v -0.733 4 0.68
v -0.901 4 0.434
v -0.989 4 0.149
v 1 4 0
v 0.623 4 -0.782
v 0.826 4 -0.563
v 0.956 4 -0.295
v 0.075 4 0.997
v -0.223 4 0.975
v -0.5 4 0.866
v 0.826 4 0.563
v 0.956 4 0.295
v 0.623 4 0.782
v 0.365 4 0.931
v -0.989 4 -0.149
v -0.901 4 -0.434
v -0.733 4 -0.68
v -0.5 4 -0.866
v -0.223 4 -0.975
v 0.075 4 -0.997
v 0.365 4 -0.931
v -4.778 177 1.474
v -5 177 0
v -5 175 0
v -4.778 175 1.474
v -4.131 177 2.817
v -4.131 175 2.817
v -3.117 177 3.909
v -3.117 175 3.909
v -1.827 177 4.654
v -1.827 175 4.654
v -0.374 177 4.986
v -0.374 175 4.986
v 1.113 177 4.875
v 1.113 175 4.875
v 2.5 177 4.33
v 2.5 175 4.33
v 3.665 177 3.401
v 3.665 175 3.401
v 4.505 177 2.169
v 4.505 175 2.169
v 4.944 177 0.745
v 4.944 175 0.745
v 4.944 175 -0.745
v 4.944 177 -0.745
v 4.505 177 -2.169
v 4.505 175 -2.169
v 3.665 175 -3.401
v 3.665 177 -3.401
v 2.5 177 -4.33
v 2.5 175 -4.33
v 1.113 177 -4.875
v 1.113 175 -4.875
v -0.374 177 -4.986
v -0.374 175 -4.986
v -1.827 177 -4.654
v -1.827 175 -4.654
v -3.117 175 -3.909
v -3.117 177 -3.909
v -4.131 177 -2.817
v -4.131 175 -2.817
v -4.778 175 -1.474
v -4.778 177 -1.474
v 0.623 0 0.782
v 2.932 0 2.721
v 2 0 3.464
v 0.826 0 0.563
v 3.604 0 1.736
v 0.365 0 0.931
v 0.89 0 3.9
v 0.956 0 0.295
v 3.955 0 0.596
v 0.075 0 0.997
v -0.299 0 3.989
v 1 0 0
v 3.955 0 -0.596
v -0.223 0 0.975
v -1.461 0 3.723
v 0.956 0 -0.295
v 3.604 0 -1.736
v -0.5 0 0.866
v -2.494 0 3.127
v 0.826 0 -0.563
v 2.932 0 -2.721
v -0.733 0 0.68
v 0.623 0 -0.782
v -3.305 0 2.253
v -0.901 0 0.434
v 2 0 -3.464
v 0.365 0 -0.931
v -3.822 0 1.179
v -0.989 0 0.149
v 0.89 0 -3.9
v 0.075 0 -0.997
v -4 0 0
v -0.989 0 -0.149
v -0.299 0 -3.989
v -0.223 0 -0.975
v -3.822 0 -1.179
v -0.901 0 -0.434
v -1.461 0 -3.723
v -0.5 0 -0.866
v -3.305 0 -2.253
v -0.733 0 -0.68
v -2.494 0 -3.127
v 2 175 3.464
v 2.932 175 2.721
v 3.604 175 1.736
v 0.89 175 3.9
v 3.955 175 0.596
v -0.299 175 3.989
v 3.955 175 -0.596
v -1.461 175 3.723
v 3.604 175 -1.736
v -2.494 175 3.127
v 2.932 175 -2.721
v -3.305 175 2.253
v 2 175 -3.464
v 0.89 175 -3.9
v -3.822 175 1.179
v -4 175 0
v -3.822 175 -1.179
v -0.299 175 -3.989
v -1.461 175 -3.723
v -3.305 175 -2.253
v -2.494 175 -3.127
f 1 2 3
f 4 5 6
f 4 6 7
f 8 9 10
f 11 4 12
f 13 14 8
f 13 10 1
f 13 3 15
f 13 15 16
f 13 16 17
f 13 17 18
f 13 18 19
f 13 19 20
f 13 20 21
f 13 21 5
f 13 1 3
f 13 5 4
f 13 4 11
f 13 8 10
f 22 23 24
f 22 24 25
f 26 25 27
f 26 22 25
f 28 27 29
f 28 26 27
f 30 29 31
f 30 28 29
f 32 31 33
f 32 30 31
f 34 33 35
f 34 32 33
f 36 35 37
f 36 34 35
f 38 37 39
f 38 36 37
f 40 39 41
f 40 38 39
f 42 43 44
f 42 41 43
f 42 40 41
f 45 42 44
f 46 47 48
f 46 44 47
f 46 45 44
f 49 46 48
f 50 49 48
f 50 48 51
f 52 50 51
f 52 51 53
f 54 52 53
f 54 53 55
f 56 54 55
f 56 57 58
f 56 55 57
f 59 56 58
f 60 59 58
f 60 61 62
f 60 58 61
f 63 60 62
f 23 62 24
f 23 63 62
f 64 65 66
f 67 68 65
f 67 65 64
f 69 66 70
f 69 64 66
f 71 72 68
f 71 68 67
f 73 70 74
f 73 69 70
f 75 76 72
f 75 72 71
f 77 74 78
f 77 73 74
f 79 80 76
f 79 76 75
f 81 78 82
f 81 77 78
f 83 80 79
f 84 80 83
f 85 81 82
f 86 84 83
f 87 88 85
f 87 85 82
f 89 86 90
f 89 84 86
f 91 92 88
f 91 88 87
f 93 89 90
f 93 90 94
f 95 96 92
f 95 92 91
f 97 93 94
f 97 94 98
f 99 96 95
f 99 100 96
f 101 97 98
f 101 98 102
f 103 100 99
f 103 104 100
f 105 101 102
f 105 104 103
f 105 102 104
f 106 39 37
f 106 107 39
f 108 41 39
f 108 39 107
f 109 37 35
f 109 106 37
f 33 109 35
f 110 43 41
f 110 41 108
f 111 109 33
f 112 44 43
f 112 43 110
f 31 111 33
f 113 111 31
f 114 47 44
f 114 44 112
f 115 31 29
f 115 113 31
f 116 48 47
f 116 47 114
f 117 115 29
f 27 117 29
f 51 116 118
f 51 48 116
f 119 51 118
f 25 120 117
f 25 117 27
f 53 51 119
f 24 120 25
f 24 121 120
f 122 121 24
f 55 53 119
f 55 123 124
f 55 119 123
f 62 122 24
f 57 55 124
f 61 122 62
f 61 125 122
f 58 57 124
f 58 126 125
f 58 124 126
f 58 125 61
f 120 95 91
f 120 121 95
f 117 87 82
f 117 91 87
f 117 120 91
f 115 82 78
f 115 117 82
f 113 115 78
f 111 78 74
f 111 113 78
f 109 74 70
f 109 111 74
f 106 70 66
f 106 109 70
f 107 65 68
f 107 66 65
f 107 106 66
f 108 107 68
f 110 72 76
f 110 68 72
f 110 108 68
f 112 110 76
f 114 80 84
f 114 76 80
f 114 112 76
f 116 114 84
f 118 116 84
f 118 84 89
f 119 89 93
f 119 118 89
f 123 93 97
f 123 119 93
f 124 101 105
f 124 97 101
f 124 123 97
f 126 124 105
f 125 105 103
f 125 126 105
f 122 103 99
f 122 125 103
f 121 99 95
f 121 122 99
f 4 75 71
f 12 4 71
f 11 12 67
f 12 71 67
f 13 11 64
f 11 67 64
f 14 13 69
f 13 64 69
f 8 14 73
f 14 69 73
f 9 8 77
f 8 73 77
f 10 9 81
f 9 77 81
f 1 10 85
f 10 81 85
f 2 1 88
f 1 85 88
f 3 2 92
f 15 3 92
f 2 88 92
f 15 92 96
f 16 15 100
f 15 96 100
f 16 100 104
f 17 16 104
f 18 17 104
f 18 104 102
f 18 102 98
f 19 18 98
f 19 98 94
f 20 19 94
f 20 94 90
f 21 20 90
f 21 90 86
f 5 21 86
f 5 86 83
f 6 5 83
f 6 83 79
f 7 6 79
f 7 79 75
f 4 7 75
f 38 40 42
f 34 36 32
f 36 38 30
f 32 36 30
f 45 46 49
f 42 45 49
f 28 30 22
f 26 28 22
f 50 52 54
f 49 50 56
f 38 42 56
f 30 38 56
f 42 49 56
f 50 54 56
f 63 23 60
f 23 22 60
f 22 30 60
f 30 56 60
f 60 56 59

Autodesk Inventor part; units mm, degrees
ref_plane "YZ Plane" through (0, 0, 0) normal (1, 0, 0) x (0, 1, 0)
ref_plane "XZ Plane" through (0, 0, 0) normal (0, 1, 0) x (-1, 0, 0)
ref_plane "XY Plane" through (0, 0, 0) normal (0, 0, 1) x (1, 0, 0)
sketch "Szkic1" plane through (0, 0, 0) normal (0, 0, 1) x (1, 0, 0)
  line L0 (0, 0) -> (-4, 0)
  line L1 (-4, 0) -> (-4, 175)
  line L2 (-4, 175) -> (0, 175)
  line L3 (0, 175) -> (0, 0)
  line L4 (-4, 175) -> (-5, 175)
  line L5 (-5, 175) -> (-5, 177)
  line L6 (-5, 177) -> (0, 177)
  line L7 (0, 177) -> (0, 175)
  dimension "d0" = 175
  dimension "d1" = 4
  dimension "d14" = 1
  dimension "d15" = 2
revolve "Obrót5" add sketch "Szkic1" angle 360 about axis through (0, 175, 0) along (0, -1, 0)
sketch "Szkic2" plane through (0, 0, 0) normal (0, -1, 0) x (1, 0, 0)
  circle A0 centre (0, 0) radius 1
  dimension "d17" = 2
extrude "Wyciągnięcie proste1" cut sketch "Szkic2" against normal blind 4
properties part number "q1_Drukowanie 3D"
